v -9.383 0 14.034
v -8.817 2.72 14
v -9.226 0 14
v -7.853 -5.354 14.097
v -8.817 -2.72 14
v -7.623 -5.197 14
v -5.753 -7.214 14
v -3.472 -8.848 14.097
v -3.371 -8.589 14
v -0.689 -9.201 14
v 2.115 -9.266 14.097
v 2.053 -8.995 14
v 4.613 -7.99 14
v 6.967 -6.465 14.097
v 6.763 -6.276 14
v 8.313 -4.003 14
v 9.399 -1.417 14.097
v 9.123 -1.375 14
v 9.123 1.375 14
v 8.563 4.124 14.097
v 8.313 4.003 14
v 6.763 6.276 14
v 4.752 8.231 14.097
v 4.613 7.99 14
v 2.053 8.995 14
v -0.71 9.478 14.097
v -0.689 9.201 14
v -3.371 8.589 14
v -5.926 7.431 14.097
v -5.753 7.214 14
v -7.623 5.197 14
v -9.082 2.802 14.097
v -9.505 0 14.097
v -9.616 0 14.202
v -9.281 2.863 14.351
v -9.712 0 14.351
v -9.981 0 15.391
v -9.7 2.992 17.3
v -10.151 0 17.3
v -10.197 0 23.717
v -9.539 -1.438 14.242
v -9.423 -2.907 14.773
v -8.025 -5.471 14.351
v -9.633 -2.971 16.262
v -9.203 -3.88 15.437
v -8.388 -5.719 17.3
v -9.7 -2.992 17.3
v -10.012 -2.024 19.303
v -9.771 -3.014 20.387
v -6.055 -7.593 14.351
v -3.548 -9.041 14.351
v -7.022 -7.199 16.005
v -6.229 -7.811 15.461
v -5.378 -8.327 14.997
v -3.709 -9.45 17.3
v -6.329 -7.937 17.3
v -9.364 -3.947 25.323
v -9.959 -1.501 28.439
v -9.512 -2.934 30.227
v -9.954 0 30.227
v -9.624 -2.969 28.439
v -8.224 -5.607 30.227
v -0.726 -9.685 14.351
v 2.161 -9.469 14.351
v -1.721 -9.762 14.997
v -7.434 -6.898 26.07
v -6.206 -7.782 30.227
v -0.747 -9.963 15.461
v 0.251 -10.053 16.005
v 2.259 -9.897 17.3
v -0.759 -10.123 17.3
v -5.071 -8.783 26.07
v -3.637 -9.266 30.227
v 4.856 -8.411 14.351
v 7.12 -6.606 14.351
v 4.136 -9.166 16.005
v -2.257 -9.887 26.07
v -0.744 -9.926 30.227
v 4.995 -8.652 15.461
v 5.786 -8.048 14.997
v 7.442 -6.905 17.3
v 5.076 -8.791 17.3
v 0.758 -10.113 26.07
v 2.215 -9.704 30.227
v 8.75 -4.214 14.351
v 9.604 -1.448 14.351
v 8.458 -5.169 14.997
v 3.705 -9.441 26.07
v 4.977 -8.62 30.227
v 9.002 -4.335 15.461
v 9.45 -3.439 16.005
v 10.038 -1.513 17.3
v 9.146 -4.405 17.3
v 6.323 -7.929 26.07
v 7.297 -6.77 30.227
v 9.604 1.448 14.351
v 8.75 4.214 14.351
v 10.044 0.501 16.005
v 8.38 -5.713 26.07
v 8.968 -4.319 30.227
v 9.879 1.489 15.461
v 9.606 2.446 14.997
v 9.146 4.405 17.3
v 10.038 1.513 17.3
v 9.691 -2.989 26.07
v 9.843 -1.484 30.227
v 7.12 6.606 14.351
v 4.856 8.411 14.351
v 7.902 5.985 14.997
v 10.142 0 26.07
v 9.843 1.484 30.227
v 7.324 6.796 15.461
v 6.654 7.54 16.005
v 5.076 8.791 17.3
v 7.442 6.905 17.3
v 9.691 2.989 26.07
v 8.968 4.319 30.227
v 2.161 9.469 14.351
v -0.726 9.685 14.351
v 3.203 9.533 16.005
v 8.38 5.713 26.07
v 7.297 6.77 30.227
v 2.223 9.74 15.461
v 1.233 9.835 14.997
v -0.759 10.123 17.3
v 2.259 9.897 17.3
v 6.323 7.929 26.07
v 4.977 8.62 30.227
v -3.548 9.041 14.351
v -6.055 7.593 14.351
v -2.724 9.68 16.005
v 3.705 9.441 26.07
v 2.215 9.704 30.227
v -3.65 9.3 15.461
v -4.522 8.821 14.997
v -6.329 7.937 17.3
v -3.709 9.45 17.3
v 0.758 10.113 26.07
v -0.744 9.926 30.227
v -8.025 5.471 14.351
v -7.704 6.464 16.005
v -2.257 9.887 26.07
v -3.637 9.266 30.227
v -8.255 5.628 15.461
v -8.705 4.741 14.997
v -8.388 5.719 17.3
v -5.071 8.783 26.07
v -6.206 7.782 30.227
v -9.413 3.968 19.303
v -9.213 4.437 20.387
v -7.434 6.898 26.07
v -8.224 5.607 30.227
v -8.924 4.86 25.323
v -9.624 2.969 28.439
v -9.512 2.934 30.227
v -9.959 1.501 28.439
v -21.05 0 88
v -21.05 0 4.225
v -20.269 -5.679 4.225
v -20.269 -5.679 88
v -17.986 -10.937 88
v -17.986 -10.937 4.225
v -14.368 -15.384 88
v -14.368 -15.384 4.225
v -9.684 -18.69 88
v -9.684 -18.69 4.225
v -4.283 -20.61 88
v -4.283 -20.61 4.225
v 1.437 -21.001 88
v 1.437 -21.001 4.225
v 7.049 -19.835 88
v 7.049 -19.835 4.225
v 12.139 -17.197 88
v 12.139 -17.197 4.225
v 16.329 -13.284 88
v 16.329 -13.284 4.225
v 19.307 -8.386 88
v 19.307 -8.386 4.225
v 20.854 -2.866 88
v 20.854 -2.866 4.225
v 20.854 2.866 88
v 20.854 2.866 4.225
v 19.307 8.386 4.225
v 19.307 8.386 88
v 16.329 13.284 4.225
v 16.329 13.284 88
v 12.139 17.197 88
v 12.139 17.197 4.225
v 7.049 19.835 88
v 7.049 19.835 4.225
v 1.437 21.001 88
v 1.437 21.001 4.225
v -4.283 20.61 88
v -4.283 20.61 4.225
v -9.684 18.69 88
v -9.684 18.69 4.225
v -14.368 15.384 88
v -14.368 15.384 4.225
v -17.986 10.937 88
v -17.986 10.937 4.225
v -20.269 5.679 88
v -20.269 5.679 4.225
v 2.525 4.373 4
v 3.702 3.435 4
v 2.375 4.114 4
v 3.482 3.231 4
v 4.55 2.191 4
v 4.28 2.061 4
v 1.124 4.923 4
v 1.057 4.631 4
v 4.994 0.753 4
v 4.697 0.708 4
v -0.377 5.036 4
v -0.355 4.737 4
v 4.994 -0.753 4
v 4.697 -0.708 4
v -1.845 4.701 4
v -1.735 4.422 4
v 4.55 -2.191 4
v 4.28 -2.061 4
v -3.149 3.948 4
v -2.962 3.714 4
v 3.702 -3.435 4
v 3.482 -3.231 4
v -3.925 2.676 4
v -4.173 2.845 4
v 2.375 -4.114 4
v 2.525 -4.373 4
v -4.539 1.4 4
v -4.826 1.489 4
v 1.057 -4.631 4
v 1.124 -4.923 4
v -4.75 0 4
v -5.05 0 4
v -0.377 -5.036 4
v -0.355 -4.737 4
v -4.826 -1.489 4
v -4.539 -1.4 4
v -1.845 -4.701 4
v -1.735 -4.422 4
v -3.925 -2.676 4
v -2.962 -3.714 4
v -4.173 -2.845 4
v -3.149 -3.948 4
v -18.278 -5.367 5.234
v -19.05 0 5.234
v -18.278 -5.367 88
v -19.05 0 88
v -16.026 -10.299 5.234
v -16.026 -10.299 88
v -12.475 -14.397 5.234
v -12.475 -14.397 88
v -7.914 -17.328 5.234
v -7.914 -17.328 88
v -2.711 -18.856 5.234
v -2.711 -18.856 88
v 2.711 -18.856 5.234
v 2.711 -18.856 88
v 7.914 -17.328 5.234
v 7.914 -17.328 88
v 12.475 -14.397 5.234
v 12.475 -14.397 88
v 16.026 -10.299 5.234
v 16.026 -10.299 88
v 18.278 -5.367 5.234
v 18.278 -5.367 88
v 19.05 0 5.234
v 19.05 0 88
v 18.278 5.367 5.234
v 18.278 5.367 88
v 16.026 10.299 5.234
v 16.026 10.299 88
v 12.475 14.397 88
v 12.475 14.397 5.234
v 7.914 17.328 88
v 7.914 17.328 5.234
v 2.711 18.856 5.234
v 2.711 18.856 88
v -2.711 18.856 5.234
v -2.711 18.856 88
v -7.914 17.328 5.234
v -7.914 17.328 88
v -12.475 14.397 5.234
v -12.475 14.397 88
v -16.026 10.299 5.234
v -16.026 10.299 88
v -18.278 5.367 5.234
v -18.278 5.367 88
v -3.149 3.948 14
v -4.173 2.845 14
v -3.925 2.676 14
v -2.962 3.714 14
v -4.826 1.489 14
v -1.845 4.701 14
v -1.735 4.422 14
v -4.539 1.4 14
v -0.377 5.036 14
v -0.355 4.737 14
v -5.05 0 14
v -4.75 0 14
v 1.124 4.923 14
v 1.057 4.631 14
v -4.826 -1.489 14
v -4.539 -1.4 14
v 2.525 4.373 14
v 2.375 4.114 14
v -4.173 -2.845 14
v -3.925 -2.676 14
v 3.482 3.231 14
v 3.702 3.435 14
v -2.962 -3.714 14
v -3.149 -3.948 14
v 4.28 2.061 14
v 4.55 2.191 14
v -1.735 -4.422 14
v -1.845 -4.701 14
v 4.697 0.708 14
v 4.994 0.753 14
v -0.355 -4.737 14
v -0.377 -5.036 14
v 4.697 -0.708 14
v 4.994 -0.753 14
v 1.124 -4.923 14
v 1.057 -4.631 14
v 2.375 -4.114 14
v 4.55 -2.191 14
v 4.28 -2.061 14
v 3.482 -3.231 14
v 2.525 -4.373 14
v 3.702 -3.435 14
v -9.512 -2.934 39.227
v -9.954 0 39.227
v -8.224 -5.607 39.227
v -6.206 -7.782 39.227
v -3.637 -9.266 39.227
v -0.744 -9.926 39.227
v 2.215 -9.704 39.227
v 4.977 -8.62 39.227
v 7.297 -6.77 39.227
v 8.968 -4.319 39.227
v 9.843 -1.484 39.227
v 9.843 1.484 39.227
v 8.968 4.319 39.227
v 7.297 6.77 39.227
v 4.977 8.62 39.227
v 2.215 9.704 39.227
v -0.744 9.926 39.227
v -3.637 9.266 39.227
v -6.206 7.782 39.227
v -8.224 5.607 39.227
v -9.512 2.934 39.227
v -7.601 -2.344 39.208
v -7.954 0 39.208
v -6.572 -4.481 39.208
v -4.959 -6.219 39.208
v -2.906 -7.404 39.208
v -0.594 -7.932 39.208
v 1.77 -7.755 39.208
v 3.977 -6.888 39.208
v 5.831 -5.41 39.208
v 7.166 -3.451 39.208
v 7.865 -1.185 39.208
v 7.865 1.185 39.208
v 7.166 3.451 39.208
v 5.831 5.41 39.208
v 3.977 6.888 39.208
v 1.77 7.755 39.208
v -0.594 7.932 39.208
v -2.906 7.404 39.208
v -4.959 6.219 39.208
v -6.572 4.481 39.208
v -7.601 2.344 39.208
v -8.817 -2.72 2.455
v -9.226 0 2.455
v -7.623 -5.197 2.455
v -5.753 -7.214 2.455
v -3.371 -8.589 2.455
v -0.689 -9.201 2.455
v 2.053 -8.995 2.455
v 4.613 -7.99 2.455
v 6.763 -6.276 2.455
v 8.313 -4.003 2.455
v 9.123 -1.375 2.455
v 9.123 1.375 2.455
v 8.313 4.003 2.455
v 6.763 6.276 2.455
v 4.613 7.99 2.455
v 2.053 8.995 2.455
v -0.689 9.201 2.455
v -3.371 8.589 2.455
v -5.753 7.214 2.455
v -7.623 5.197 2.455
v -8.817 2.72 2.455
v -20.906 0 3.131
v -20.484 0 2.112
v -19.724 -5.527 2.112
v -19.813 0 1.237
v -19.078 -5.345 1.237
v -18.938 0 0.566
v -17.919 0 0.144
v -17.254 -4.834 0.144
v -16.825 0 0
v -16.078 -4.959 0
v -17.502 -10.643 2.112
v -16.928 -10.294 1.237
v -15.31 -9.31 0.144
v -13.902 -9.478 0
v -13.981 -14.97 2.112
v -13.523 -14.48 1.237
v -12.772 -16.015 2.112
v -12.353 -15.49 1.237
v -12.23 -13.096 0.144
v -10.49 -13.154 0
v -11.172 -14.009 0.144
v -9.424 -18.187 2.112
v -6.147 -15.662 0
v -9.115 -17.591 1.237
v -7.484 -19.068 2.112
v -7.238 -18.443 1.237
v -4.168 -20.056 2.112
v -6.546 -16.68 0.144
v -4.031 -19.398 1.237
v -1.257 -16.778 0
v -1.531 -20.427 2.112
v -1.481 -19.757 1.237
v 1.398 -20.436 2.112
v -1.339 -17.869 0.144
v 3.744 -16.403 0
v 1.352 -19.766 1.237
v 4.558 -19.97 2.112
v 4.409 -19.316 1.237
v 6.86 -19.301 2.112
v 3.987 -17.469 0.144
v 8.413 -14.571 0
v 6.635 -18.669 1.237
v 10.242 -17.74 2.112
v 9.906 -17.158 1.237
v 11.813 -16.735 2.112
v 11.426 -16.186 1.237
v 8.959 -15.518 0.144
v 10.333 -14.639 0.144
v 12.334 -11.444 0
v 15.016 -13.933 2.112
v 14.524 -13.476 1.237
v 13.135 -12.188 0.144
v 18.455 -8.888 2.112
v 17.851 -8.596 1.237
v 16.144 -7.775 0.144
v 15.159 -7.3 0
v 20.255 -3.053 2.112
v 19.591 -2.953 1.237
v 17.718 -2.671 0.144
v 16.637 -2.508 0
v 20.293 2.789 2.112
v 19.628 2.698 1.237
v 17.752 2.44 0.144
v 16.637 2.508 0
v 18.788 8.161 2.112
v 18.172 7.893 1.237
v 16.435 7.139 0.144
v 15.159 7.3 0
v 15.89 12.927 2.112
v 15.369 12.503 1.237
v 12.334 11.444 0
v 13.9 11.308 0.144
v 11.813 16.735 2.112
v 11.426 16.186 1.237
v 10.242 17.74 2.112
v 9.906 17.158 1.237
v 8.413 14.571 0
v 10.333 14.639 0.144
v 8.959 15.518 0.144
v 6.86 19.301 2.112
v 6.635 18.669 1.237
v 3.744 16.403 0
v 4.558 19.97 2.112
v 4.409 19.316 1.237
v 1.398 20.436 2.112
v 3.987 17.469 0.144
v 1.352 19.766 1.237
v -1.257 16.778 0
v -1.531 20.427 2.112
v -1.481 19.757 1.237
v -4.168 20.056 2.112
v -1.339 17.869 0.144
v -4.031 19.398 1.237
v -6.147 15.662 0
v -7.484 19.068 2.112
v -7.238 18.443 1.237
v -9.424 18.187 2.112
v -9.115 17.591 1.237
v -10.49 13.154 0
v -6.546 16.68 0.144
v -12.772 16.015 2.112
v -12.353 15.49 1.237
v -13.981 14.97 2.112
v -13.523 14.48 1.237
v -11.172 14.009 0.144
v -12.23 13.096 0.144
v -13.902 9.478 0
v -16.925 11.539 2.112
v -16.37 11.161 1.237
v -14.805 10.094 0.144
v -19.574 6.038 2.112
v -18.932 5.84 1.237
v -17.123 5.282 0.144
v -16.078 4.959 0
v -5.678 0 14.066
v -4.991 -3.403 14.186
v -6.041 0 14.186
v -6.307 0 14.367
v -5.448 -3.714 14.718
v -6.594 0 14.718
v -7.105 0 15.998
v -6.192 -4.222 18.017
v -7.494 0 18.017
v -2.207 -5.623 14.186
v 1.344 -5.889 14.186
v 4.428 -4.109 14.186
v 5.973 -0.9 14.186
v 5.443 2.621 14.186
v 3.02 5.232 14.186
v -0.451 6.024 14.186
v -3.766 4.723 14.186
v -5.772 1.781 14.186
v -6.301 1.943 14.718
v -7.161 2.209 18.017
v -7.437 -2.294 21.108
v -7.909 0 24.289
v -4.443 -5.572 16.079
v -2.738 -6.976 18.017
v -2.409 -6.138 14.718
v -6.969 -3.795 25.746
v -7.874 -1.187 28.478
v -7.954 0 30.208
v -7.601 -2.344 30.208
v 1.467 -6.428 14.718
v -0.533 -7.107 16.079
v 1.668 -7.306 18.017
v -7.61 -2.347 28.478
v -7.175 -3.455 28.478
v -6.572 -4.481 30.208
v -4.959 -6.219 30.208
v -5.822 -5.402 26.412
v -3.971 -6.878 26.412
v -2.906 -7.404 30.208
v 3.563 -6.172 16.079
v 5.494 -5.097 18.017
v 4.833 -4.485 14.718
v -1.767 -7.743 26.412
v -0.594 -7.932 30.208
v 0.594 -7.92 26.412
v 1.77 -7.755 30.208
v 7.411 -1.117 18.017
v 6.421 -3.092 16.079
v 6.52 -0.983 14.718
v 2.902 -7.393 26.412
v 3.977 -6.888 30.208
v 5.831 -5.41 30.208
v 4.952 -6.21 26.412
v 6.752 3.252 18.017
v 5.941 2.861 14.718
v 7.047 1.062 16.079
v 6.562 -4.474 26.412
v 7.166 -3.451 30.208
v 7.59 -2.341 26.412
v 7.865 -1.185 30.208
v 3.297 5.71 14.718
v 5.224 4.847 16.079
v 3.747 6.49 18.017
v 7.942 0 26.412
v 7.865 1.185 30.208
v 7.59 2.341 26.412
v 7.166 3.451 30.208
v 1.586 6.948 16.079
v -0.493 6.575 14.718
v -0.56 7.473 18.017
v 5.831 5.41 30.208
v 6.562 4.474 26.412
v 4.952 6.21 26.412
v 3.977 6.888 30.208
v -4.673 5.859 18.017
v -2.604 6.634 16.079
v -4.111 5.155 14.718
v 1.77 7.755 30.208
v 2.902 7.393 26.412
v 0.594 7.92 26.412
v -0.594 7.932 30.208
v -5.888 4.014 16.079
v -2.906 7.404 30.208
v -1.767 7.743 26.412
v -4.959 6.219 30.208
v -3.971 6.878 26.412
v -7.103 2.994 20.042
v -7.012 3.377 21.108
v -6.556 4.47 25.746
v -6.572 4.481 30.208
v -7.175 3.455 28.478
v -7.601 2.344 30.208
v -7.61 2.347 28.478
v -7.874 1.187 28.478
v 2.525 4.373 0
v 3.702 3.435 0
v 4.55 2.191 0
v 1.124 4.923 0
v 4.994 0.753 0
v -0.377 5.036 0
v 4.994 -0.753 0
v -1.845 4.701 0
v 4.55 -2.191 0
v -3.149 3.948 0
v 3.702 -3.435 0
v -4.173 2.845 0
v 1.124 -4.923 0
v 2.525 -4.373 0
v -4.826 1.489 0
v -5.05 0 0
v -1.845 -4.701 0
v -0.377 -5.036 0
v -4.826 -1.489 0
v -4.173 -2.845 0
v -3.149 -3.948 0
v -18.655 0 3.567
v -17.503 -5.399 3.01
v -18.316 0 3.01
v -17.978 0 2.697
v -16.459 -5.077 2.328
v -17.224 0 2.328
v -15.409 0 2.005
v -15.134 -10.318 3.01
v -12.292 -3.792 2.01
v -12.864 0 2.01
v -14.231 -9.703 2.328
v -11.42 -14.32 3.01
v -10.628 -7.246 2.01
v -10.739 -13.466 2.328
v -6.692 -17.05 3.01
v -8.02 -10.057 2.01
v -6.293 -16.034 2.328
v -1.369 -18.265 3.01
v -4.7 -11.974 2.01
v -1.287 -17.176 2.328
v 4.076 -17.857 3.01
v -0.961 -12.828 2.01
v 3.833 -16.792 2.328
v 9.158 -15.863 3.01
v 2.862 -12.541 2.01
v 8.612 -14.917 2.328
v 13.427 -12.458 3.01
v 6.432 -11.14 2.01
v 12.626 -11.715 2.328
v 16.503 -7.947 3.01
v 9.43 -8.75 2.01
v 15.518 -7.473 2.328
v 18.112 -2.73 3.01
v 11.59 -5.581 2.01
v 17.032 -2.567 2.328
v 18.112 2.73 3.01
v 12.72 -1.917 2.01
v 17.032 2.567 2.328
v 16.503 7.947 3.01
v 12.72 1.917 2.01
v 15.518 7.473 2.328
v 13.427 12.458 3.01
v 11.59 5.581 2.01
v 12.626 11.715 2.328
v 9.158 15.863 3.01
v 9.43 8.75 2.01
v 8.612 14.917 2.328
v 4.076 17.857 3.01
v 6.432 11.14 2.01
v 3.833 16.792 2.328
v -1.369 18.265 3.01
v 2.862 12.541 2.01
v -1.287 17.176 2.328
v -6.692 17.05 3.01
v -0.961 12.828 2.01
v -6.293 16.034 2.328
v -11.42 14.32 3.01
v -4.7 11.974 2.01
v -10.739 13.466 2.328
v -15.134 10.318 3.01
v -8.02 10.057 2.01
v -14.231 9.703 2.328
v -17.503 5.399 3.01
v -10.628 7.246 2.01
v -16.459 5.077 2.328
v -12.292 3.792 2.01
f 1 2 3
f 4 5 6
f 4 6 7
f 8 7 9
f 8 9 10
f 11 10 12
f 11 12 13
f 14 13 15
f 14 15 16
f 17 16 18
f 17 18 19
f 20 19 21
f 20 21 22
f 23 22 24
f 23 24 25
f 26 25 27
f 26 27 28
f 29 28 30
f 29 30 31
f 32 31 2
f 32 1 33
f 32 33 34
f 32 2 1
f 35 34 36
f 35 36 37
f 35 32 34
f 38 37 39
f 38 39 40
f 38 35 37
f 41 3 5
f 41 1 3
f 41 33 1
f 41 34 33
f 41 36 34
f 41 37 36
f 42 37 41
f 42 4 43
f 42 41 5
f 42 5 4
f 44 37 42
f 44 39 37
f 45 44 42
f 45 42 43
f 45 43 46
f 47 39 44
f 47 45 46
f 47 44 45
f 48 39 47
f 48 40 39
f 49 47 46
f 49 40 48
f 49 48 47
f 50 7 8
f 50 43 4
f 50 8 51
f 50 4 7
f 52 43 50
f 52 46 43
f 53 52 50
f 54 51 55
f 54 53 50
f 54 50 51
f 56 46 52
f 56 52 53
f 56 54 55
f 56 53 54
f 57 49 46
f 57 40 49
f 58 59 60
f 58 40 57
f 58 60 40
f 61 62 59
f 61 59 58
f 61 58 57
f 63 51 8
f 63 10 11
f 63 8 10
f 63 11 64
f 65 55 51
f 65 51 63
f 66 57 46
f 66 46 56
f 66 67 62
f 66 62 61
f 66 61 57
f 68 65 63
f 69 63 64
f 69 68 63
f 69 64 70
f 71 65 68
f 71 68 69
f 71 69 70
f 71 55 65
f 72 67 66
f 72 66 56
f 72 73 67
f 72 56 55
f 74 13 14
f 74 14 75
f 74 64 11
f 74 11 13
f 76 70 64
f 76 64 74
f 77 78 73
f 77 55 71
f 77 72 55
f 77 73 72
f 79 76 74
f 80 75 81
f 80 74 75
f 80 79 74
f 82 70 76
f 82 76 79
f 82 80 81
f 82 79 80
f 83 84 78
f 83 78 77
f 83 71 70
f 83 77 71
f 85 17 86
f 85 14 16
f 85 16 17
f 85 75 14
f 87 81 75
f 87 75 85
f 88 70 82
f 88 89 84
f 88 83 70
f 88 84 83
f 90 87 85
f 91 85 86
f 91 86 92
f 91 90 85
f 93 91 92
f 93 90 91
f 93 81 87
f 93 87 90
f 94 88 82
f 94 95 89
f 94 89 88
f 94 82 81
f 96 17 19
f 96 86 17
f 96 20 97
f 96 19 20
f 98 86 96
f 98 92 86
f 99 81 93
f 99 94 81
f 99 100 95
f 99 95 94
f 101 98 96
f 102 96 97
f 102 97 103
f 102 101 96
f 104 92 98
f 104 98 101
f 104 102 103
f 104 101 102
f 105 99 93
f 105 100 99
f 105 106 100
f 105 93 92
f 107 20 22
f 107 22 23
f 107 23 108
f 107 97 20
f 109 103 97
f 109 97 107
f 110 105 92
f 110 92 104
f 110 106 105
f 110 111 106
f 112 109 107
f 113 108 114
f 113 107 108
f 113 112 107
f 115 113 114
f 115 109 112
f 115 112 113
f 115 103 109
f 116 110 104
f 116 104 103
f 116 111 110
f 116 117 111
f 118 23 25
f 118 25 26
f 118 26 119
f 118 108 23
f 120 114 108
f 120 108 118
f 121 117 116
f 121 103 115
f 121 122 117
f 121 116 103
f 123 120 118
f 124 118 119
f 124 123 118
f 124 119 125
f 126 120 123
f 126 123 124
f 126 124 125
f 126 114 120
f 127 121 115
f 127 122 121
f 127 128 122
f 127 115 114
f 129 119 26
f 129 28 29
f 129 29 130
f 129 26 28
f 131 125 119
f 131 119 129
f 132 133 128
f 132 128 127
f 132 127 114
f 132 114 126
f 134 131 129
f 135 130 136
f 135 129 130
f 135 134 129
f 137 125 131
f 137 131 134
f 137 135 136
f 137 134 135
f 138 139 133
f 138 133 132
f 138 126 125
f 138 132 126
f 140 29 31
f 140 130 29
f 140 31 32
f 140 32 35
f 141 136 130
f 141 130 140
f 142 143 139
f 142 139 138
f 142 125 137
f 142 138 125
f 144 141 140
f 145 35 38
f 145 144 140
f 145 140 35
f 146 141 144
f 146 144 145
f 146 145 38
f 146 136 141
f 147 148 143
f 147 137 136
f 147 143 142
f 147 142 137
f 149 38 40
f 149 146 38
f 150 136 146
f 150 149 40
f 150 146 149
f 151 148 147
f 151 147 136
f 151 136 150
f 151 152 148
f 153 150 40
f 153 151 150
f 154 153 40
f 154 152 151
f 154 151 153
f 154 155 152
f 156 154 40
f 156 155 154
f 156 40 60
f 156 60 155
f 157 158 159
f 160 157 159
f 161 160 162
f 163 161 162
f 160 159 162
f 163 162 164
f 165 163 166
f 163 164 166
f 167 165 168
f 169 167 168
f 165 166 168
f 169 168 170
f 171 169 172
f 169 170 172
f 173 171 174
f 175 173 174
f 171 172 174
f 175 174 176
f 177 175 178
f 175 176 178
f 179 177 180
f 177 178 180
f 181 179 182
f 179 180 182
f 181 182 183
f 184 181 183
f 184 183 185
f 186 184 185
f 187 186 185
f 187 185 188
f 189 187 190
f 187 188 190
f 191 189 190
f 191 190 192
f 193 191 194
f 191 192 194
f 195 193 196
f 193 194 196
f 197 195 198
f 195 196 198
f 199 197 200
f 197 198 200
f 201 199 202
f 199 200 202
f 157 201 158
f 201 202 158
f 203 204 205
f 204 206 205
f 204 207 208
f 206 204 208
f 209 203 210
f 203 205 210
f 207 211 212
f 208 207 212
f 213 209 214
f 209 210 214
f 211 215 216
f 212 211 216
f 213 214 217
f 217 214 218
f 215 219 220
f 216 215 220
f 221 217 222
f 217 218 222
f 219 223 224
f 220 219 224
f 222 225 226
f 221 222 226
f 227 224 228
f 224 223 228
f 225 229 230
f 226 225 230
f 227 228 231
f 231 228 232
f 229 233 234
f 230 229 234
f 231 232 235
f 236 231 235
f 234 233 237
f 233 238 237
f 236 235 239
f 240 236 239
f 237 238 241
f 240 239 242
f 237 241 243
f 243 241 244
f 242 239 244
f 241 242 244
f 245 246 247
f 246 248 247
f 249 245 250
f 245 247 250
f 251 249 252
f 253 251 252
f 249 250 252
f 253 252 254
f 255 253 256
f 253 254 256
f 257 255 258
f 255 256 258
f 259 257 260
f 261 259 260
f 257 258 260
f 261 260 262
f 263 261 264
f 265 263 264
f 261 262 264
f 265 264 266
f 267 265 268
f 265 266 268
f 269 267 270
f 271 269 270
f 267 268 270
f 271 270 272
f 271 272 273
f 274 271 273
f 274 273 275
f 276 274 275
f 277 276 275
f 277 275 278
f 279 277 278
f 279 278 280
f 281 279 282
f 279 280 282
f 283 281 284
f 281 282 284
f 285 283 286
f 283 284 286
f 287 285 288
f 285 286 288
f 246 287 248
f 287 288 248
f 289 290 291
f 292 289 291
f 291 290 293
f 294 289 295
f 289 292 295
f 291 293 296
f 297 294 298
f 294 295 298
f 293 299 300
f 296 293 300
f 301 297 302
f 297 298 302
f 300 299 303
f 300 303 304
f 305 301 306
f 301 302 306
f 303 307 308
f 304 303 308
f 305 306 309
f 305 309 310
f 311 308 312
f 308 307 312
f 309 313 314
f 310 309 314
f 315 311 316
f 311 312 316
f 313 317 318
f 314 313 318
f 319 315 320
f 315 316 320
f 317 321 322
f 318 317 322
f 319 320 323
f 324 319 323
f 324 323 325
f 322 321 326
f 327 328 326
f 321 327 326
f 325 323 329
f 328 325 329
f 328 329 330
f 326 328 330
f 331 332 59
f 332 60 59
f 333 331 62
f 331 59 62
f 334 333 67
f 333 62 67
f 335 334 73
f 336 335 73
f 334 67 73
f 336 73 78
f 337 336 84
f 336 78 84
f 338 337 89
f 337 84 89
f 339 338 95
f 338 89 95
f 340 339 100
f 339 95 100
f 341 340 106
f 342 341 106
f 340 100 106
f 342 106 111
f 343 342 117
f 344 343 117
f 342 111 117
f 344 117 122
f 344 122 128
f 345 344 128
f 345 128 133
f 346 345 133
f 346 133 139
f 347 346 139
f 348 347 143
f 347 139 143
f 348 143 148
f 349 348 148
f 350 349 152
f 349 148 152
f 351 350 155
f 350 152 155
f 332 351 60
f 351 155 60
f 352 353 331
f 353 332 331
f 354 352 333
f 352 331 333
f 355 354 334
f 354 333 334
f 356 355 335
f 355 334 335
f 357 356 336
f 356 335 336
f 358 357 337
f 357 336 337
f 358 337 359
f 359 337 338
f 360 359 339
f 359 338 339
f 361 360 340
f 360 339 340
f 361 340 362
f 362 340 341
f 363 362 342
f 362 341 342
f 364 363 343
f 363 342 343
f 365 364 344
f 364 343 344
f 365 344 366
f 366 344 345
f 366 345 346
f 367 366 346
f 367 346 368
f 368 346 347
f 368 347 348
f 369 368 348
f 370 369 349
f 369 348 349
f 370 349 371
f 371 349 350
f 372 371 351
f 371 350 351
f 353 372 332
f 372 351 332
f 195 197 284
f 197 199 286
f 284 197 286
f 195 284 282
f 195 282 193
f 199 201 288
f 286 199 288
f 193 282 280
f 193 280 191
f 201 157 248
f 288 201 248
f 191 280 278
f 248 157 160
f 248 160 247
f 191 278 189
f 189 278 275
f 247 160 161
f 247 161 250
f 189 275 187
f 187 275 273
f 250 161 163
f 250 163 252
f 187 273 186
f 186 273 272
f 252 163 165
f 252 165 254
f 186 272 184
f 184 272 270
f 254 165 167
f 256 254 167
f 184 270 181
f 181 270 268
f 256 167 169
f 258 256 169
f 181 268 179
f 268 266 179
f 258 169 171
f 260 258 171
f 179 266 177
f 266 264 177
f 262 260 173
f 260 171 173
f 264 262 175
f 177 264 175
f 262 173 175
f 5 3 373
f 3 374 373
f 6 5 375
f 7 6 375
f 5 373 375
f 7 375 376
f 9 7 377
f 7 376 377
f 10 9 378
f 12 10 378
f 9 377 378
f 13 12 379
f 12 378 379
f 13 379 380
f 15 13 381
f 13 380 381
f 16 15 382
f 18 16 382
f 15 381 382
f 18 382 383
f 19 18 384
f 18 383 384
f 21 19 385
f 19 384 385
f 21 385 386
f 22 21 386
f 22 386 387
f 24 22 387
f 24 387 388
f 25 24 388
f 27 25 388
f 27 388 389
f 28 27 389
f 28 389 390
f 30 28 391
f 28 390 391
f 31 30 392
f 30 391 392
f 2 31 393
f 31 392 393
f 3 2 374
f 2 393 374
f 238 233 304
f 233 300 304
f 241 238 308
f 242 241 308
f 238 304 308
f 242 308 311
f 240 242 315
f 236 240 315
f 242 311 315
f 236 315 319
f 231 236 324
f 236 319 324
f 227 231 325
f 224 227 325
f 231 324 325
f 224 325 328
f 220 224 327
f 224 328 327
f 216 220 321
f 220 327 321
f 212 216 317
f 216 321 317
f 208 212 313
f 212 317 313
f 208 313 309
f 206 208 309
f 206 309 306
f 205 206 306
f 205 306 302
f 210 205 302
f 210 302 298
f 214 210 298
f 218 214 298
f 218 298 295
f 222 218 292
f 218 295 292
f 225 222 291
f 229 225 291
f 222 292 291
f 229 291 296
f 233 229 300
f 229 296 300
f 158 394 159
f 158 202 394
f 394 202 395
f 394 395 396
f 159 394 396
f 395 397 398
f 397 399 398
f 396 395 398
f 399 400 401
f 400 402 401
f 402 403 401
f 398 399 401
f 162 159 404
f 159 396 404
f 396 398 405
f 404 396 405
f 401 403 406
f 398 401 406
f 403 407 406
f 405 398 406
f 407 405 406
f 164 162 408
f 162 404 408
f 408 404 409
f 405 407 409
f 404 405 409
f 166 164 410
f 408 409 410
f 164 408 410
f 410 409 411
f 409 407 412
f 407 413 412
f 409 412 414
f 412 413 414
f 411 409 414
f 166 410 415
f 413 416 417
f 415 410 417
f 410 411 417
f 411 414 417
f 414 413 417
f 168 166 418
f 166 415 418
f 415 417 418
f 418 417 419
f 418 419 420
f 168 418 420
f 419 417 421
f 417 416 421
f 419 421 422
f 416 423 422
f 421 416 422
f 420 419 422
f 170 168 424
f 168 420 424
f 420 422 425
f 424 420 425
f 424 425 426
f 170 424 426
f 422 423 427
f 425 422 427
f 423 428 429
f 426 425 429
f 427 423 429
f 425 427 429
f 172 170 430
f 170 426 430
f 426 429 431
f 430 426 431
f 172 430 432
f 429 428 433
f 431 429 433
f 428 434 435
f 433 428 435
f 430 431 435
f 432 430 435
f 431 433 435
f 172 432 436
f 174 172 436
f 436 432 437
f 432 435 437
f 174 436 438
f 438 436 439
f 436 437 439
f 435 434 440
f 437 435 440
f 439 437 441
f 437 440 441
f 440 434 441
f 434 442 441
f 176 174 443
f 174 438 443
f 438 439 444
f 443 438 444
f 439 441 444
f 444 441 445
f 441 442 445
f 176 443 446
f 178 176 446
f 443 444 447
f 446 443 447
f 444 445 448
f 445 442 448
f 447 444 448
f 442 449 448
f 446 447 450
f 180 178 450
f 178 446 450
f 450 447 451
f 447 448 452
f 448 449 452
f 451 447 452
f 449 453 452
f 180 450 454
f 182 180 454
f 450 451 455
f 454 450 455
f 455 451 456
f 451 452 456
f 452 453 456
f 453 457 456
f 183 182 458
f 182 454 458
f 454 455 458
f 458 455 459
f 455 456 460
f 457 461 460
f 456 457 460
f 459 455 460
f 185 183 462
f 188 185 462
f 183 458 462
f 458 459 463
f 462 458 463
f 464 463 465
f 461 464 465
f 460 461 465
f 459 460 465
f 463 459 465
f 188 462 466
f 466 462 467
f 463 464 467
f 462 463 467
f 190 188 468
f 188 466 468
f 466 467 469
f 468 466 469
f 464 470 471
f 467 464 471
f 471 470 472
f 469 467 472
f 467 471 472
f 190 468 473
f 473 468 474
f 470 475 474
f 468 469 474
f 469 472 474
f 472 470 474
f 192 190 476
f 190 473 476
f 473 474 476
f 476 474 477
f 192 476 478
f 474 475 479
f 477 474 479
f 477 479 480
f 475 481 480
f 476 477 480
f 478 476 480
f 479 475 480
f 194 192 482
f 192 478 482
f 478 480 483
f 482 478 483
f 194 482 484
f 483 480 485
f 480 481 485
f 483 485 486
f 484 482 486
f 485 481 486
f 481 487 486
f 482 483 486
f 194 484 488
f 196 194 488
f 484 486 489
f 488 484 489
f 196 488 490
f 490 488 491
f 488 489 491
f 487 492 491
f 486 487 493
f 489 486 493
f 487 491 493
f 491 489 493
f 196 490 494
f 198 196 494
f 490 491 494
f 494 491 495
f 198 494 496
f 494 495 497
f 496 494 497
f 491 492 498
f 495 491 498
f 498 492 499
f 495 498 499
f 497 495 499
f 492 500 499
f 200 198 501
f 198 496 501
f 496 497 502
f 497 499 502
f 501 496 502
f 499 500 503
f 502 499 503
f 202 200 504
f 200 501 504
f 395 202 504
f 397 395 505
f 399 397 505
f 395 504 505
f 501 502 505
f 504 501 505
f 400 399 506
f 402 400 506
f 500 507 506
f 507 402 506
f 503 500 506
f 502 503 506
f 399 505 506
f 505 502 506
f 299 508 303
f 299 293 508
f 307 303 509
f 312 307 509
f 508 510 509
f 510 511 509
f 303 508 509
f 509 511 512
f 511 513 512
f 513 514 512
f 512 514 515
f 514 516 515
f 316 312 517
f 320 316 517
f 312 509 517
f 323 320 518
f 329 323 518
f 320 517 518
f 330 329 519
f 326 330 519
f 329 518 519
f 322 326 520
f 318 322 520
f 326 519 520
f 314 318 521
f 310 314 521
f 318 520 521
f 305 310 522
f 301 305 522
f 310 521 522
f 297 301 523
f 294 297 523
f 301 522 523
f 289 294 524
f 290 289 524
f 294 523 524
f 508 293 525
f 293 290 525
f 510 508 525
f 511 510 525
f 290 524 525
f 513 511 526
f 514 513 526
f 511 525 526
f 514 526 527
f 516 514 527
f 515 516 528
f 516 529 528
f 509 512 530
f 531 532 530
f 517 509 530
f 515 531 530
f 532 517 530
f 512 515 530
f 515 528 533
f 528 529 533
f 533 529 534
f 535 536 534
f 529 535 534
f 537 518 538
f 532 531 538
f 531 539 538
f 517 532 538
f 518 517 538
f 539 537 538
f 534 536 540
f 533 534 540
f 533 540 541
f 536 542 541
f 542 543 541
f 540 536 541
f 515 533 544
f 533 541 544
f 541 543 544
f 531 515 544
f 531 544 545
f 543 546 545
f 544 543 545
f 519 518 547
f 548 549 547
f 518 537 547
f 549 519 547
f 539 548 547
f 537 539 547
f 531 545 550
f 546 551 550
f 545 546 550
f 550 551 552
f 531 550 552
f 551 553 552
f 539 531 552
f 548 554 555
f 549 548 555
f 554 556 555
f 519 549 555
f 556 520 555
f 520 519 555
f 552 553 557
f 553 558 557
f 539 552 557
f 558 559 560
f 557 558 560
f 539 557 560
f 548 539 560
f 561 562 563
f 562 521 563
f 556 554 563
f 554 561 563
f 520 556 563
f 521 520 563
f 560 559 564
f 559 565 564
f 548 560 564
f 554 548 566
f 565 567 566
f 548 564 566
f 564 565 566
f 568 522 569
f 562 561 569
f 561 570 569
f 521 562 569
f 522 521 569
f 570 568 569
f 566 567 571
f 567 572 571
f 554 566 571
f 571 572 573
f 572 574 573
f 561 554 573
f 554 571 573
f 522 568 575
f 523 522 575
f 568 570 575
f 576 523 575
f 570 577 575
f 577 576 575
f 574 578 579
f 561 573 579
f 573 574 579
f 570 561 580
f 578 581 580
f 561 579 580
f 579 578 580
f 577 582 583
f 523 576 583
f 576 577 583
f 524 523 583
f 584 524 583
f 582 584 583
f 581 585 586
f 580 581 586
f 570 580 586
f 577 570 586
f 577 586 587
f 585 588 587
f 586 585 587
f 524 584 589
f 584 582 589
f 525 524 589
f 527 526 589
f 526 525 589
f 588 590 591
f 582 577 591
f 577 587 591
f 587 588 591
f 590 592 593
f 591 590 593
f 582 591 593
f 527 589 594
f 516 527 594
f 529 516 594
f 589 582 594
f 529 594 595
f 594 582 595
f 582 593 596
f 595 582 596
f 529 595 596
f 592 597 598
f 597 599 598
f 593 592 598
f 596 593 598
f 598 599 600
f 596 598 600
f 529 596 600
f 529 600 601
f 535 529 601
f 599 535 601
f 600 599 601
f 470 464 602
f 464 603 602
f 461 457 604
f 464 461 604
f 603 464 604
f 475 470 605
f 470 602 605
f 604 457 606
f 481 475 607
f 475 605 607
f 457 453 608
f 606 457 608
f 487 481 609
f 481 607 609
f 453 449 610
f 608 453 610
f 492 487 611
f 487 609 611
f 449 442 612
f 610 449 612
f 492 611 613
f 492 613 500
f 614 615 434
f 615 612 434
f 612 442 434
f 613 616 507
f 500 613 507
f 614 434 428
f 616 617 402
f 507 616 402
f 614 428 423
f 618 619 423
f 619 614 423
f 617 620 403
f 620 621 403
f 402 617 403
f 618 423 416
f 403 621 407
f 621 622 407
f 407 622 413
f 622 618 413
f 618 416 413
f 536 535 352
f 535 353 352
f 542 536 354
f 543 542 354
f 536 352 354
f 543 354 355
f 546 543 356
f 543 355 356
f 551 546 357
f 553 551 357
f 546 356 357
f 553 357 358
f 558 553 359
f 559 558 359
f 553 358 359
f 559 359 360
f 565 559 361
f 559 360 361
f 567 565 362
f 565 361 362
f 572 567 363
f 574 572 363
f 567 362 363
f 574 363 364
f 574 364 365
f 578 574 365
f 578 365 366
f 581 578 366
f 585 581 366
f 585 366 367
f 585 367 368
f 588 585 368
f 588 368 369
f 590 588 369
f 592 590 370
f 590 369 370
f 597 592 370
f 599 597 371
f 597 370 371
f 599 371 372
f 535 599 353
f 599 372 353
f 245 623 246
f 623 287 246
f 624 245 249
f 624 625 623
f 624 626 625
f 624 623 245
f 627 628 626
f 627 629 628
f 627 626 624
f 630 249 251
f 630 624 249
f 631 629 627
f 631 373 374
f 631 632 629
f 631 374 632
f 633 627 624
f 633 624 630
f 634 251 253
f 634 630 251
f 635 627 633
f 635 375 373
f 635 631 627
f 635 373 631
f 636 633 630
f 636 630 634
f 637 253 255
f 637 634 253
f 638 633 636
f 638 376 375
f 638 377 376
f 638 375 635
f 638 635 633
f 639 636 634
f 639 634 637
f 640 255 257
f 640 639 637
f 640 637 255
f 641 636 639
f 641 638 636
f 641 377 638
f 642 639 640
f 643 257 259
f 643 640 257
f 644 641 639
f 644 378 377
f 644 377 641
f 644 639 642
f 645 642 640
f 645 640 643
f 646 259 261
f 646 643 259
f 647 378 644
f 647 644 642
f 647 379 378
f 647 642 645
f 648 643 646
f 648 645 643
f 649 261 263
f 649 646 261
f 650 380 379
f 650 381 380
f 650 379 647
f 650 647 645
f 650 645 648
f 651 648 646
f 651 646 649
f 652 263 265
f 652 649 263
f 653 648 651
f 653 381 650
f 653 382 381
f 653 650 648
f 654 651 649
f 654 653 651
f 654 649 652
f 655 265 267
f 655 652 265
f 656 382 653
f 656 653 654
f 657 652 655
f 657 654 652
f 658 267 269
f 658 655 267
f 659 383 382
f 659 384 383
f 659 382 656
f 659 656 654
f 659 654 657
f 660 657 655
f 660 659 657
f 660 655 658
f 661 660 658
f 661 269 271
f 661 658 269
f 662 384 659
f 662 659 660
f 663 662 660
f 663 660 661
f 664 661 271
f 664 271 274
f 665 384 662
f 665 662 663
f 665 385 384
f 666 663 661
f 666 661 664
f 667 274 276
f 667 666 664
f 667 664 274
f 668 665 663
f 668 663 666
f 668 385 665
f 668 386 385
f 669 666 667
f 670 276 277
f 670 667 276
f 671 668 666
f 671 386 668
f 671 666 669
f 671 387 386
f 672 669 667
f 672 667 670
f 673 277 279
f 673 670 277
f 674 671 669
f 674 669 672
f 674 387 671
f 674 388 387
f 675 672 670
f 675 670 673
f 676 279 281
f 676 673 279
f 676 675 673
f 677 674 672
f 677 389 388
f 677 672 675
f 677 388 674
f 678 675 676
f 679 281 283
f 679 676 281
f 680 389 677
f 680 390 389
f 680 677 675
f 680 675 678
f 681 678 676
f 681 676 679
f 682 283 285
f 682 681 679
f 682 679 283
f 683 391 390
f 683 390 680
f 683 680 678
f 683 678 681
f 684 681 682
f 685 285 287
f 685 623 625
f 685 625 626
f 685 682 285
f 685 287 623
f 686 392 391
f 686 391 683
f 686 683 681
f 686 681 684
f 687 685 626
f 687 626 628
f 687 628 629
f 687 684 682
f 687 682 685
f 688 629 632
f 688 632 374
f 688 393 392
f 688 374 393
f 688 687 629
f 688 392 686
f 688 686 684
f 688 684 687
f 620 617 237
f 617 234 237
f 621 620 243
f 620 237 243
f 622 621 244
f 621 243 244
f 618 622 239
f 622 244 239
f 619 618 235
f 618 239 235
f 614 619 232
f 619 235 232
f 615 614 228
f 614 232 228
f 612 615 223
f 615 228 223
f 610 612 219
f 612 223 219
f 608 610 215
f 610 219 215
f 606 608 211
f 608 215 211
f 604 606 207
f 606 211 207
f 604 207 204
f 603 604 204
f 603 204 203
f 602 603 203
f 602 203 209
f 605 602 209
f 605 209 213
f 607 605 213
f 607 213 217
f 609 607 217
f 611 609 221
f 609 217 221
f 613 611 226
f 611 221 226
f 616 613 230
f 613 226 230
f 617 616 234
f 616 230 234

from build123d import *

# Parameters (mm, degrees)
F2_R = 4.2248737342


with BuildPart() as f1:
    # F0 (on Front) → F1 (revolve)
    with BuildSketch(Plane.XZ):
        with BuildLine():
            Line((-9.2264421542, 14), (-5.05, 14))
            add(Edge.make_bspline(
                [(-5.05, 14), (-5.2072363825, 14.0810028272), (-7.9343017899, 13.3850205174), (-7.9161451117, 27.8848960237), (-7.9913089744, 29.7148263859), (-7.9540337168, 30.2082094767)],
                knots=[0, 0, 0, 0, 0.1839441933, 0.7528458391, 1, 1, 1, 1], degree=3))
            Line((-7.9540337168, 30.2082094767), (-7.9540337168, 39.2082094767))
            Line((-7.9540337168, 39.2082094767), (-9.9539440577, 39.2271469541))
            Line((-9.9539440577, 39.2271469541), (-9.9539440577, 30.2271469541))
            add(Edge.make_bspline(
                [(-9.2264421542, 14), (-9.3868926202, 14.0217893951), (-10.5124276426, 14.24964973), (-10.0890154715, 27.7222878167), (-10.0266310522, 30), (-9.9539440577, 30.2271469541)],
                knots=[0, 0, 0, 0, 0.1370918561, 0.7422285722, 1, 1, 1, 1], degree=3))
        make_face()
        with BuildLine():
            Line((-8.05, 0), (-5.05, 0))
            Line((-5.05, 0), (-5.05, 4))
            Line((-5.05, 4), (-4.75, 4))
            Line((-4.75, 4), (-4.75, 14))
            Line((-4.75, 14), (-5.05, 14))
            Line((-5.05, 14), (-9.2264421542, 14))
            Line((-9.2264421542, 14), (-9.2264421542, 2.4549234658))
            add(Edge.make_bspline(
                [(-19.05, 5.2343760617), (-18.8808851703, 4.2130953372), (-18.5850778449, 1.9601937624), (-12.7121775245, 1.892012544), (-10.6474171038, 2.2360002455), (-9.2264421542, 2.4549234658)],
                knots=[0, 0, 0, 0, 0.2839843179, 0.664766452, 1, 1, 1, 1], degree=3))
            Line((-19.05, 5.2343760617), (-19.05, 88))
            Line((-19.05, 88), (-21.05, 88))
            Line((-21.05, 88), (-21.05, 0))
            Line((-21.05, 0), (-8.05, 0))
        make_face()
    revolve(axis=Axis((0, 0, 10.4999532923), (0, 0, 1)))

    # F2
    f2_edges = [f1.edges().sort_by_distance(p)[0] for p in [
        (21.05, 0, 0),
    ]]
    fillet(f2_edges, radius=F2_R)


solid = f1.part
